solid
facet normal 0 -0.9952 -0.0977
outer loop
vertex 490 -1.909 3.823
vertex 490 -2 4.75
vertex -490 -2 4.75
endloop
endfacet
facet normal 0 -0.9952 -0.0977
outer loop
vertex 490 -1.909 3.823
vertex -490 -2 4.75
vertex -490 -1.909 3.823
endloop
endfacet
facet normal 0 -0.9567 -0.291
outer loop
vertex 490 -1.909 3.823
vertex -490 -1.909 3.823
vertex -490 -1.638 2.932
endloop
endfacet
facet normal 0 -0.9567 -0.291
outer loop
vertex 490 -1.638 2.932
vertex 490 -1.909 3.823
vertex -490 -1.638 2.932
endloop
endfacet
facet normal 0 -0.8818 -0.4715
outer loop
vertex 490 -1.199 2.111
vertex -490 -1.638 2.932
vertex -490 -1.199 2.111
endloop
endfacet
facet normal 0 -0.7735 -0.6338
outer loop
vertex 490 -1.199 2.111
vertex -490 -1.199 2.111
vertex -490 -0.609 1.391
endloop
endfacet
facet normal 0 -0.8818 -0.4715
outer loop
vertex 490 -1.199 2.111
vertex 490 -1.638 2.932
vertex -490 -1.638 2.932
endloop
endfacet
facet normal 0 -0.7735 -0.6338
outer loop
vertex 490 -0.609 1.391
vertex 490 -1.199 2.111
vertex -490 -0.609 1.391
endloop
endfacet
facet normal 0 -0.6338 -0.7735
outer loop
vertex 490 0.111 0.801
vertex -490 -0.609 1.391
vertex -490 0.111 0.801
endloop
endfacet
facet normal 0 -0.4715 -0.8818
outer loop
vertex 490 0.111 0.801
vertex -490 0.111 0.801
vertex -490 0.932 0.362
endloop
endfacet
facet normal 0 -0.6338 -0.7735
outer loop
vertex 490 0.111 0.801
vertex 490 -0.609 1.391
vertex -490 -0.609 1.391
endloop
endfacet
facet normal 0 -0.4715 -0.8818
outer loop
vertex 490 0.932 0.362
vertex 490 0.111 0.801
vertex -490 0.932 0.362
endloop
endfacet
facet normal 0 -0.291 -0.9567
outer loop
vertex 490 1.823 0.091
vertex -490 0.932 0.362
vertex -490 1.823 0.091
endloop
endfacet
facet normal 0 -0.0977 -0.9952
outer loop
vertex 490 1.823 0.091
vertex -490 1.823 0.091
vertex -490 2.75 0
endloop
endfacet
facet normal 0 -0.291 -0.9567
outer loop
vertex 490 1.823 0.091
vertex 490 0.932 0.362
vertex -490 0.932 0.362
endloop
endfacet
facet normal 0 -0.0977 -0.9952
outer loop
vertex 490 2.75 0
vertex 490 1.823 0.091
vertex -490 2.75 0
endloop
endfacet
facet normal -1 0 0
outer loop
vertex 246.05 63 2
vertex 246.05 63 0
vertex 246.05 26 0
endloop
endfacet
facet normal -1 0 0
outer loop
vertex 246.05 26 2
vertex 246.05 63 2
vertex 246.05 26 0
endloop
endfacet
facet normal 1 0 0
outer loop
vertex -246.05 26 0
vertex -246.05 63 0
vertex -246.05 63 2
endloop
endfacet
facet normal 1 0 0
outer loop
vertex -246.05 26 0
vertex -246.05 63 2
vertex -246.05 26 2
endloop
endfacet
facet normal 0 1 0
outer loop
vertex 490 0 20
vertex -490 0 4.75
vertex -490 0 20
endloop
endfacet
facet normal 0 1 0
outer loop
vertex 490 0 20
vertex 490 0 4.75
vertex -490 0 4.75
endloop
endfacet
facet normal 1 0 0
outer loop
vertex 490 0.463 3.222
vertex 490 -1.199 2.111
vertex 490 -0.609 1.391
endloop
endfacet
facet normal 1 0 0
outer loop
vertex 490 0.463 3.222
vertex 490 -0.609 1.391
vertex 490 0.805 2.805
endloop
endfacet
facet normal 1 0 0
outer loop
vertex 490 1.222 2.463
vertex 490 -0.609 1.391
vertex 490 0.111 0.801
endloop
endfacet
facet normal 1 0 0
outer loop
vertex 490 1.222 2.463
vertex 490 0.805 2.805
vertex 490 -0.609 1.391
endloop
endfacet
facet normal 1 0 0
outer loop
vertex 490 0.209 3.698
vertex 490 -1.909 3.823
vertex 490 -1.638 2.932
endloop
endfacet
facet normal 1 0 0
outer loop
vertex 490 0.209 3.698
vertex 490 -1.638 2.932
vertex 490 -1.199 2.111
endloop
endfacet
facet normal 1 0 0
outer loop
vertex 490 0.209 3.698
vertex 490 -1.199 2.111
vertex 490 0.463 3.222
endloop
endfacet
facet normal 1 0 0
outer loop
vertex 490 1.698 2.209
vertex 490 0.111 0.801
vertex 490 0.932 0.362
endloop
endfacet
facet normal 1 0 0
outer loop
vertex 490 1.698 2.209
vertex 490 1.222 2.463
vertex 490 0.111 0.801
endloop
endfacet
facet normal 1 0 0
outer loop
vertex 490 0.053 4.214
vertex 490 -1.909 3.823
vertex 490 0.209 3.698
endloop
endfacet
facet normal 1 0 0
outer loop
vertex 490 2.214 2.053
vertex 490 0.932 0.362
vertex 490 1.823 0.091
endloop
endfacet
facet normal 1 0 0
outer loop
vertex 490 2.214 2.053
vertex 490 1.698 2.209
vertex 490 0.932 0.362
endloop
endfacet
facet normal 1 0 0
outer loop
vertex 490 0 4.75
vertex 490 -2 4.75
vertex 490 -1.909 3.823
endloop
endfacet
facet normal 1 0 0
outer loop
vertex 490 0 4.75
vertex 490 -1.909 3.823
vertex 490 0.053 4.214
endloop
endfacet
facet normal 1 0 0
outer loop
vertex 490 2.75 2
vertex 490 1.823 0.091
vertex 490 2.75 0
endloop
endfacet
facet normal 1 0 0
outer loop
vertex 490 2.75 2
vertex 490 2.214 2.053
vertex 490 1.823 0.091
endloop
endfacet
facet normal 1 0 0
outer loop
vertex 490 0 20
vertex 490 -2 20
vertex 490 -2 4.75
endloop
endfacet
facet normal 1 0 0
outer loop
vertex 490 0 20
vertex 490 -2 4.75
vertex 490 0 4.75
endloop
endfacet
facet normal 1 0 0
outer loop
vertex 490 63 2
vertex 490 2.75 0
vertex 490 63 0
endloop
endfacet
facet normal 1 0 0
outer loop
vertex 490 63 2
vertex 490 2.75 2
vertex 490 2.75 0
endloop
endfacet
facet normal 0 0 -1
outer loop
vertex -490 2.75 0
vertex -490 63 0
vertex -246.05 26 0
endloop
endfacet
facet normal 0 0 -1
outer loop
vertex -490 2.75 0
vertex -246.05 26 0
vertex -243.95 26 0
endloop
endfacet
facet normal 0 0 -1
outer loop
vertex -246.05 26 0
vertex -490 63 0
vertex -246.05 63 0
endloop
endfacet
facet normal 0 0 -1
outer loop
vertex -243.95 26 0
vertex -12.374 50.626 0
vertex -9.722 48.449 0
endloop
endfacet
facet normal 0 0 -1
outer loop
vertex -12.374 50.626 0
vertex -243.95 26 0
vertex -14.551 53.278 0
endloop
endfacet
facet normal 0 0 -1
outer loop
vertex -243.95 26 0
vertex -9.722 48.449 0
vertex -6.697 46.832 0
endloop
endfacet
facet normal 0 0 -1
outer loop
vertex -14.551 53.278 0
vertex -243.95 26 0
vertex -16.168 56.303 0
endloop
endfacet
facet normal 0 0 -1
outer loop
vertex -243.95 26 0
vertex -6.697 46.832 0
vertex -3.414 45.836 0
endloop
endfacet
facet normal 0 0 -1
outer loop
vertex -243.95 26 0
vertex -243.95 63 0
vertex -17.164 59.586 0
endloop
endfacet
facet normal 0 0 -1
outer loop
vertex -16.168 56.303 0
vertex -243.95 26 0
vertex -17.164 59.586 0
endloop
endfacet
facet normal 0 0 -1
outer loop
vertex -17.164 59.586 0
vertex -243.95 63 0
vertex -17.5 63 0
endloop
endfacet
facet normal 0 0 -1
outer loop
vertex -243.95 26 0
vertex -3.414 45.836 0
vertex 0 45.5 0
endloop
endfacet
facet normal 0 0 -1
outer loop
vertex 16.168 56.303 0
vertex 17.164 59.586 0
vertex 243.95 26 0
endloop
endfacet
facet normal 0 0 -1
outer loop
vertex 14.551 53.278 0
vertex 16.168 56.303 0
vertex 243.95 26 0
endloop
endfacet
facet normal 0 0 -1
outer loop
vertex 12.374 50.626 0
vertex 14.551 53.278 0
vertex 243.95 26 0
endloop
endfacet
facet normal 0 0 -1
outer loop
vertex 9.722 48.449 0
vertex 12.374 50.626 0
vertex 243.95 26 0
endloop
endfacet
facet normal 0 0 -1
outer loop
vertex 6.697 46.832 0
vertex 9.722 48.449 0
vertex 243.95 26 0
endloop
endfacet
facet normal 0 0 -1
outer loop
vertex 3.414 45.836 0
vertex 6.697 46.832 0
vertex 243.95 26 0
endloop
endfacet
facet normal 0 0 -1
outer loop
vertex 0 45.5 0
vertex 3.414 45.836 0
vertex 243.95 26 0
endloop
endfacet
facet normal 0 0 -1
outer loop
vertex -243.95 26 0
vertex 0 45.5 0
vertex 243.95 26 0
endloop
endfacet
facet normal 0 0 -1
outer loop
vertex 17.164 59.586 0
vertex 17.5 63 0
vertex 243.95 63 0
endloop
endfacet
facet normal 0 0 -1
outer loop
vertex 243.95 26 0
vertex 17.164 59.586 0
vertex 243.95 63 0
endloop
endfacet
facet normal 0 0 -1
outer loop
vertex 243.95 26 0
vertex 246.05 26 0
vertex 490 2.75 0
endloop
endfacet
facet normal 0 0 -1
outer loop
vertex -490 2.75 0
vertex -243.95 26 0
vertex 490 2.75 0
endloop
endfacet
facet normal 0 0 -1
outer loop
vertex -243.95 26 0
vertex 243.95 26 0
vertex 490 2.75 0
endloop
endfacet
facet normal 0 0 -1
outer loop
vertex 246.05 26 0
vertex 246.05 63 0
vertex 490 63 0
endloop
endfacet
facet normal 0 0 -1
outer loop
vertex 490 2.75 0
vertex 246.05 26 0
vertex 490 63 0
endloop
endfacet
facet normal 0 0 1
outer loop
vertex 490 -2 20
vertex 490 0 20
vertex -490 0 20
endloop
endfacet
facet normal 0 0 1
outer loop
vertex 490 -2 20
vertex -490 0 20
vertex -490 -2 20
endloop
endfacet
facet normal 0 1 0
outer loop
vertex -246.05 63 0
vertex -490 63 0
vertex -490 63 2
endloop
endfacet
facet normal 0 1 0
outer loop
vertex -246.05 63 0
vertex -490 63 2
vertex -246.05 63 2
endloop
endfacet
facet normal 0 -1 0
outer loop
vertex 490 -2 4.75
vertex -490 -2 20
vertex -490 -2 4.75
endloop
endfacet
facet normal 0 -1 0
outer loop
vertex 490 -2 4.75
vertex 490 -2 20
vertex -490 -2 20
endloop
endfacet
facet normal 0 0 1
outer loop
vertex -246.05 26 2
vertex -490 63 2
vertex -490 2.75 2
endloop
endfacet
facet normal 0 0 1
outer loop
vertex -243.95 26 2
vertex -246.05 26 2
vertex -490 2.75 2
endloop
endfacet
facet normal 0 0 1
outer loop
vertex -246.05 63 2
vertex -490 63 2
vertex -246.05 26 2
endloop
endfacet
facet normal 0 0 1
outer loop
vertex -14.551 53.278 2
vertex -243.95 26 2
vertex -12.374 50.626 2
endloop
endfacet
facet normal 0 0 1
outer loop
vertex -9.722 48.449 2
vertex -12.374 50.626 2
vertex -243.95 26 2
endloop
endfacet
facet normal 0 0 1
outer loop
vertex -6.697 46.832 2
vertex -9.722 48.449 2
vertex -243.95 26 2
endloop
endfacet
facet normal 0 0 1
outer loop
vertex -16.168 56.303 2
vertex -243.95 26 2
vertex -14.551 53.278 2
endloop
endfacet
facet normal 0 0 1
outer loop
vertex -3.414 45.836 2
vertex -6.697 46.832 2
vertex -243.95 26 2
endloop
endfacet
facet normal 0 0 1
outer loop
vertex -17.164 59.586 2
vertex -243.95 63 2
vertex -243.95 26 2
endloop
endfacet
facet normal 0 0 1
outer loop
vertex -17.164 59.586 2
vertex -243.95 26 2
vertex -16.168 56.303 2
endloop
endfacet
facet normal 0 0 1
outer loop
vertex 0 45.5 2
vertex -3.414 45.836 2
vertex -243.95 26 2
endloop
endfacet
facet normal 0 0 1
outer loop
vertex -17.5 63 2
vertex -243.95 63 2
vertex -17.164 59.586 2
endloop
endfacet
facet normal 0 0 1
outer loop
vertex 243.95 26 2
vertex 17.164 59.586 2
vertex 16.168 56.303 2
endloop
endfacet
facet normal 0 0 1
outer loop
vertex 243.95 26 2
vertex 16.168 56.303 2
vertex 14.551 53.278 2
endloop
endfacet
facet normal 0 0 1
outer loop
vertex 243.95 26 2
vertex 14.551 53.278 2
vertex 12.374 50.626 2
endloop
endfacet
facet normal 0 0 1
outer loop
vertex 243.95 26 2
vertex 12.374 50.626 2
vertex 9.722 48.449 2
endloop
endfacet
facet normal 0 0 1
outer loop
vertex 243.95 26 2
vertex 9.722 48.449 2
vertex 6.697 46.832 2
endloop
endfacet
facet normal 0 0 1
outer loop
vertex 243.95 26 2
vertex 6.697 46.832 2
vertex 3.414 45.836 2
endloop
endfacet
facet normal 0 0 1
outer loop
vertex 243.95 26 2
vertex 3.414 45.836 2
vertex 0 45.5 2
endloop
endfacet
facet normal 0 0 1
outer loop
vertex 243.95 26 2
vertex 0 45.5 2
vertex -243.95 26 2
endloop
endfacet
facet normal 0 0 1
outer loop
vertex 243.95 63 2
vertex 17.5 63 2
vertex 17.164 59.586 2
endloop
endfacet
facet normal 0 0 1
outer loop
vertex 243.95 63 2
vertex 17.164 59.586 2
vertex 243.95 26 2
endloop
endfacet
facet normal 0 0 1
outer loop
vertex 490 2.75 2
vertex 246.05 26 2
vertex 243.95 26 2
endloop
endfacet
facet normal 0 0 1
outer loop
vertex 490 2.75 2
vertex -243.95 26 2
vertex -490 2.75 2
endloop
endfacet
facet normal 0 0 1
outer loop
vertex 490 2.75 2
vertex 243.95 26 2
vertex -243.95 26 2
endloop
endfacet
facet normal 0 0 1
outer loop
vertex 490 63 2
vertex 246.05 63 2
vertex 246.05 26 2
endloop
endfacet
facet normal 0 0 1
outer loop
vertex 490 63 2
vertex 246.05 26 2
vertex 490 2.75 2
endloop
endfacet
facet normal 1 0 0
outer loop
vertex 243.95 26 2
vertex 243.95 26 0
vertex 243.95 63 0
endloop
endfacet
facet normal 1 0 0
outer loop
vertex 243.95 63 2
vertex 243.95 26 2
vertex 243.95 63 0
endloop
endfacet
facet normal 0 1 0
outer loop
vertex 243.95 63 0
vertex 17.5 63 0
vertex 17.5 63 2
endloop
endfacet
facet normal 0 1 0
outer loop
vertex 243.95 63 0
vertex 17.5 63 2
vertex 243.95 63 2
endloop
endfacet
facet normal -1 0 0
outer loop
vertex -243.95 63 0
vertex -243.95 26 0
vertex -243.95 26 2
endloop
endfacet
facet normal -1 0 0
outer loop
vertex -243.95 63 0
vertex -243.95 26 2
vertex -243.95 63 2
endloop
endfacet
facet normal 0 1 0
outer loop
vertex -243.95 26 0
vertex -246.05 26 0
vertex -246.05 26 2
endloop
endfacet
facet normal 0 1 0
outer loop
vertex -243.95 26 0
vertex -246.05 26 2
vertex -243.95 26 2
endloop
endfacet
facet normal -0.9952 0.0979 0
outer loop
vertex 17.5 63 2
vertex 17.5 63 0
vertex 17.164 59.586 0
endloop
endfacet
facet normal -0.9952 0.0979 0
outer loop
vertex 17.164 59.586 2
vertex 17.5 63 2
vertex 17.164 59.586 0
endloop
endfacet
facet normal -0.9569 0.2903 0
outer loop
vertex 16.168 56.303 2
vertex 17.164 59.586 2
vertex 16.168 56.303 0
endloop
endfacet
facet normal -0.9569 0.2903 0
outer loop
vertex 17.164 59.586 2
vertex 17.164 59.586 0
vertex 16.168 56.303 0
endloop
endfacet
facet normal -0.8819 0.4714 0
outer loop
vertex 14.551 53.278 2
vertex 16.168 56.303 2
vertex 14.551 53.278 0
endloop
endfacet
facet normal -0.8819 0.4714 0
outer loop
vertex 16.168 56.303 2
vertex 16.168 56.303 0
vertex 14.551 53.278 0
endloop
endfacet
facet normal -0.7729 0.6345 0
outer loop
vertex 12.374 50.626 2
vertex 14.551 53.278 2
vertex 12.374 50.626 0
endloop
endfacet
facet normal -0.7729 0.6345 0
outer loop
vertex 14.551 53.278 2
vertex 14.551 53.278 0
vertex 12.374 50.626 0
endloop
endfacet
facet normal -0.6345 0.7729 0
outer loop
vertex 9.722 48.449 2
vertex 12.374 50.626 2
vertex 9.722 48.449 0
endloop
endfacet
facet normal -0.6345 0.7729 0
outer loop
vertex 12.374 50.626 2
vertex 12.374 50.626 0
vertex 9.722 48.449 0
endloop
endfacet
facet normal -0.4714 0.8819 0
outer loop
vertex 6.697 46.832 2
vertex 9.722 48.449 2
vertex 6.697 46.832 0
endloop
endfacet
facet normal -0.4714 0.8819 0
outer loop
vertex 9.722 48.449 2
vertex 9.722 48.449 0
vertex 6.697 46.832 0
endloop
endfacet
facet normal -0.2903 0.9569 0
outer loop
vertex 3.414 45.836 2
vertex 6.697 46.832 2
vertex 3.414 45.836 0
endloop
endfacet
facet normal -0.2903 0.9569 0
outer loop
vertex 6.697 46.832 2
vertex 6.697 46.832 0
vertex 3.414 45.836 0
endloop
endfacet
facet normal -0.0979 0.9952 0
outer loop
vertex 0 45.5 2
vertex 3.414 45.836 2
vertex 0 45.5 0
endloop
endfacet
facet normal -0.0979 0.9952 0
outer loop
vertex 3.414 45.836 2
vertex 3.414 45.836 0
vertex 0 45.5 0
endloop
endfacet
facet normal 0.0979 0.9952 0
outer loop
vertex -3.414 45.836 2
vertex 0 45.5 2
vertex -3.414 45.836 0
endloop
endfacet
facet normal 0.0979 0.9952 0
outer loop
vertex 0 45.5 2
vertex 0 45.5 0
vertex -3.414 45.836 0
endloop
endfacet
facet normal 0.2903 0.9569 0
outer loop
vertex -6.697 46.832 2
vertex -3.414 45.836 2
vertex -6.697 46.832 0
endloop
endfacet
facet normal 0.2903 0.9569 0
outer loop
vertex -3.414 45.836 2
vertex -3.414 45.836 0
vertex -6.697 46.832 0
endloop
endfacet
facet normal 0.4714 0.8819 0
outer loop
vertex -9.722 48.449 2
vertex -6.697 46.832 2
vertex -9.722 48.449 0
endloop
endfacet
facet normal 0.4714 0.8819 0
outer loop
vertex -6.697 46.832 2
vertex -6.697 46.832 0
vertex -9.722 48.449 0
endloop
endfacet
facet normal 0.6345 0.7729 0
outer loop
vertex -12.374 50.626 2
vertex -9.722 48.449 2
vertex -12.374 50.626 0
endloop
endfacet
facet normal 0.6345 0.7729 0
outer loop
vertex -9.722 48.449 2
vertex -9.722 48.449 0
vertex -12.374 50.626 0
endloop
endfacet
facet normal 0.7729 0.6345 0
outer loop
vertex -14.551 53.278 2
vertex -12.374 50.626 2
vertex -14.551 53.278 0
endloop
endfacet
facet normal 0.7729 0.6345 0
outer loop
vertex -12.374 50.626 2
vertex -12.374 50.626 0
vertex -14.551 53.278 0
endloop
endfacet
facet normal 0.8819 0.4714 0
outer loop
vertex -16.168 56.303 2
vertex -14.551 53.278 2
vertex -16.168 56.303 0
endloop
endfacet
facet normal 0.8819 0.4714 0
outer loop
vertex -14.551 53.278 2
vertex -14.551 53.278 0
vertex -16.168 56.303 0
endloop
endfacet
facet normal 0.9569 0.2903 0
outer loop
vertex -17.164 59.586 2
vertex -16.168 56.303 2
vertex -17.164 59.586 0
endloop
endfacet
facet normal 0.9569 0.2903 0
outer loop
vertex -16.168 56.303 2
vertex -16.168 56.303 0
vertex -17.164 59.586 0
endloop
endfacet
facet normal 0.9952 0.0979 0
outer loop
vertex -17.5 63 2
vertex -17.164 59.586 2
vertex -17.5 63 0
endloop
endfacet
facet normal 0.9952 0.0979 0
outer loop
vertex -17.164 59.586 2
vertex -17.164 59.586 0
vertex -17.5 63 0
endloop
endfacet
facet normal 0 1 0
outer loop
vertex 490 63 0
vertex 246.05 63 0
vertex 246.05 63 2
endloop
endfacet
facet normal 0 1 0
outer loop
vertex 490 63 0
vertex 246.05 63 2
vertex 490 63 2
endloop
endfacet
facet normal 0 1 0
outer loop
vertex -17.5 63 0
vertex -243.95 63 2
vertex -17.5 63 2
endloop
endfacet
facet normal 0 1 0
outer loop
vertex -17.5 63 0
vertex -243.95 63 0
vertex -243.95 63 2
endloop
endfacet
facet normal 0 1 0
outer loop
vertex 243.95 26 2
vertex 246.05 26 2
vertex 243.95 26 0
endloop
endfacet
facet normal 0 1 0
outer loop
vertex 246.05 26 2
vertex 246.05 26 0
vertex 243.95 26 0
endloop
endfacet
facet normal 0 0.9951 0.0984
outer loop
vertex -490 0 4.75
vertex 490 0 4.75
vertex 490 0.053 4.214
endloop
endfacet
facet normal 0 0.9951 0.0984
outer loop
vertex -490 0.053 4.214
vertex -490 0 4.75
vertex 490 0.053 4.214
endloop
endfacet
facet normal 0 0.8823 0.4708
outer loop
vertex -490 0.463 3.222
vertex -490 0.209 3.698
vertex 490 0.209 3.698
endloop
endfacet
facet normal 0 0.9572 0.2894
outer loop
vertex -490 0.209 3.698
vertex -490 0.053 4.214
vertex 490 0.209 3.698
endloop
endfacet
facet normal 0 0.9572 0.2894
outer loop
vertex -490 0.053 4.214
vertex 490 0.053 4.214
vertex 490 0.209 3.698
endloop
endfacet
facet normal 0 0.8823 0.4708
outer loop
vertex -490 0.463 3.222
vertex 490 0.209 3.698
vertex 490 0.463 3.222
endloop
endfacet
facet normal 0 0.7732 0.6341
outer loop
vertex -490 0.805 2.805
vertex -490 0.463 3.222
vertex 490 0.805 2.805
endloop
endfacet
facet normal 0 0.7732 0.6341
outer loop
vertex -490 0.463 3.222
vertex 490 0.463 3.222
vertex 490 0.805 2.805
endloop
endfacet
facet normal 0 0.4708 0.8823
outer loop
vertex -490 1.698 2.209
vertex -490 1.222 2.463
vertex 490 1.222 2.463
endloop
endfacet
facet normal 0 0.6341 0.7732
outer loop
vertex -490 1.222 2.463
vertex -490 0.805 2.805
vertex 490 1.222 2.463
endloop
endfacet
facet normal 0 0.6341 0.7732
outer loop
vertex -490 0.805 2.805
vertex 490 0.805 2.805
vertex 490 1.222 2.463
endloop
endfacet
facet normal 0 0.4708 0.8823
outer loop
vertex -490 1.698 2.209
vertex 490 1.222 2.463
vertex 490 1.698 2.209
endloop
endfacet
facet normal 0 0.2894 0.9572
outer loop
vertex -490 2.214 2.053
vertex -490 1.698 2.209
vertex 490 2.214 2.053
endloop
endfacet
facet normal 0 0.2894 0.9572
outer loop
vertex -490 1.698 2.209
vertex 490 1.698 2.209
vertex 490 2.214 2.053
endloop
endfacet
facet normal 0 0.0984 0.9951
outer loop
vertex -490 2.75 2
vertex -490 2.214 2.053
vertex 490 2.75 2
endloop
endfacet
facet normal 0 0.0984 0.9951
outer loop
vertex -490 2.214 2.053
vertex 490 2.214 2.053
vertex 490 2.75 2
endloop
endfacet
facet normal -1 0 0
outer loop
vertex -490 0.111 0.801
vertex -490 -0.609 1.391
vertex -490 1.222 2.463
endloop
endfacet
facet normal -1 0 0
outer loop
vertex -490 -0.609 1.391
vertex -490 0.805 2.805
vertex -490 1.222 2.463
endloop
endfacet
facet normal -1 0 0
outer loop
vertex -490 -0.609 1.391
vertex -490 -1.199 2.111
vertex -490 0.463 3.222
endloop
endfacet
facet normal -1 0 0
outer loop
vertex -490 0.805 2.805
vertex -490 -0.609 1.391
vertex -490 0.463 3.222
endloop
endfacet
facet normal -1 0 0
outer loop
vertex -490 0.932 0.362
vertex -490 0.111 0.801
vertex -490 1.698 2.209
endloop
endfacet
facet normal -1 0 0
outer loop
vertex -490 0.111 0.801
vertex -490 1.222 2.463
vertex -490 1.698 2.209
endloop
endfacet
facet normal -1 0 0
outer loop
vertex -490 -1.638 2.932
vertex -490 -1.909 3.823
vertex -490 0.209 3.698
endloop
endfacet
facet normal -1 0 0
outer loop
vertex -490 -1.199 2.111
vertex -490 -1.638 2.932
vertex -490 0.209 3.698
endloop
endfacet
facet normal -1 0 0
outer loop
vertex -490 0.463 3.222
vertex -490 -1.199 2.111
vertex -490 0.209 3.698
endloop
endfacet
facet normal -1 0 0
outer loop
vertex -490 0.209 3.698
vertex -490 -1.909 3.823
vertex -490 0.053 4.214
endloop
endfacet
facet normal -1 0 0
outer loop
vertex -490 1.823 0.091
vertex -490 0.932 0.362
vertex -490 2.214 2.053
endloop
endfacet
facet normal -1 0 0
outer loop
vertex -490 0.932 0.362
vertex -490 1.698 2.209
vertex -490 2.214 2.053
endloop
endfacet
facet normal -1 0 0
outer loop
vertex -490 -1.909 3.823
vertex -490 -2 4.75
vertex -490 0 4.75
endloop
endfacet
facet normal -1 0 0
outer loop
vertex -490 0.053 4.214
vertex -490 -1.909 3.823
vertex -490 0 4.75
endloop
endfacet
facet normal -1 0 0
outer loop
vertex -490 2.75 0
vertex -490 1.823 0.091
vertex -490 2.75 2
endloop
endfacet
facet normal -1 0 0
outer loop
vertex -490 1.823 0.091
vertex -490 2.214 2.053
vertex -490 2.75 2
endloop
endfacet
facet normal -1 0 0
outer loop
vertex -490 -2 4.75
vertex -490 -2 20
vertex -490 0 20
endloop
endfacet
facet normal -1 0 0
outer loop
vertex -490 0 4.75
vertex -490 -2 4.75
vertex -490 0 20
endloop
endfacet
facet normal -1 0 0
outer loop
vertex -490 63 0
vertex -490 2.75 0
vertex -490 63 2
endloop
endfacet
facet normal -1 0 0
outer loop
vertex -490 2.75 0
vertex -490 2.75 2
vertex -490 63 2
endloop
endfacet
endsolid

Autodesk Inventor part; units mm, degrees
ref_plane "YZ Plane" through (0, 0, 0) normal (1, 0, 0) x (0, 1, 0)
ref_plane "XZ Plane" through (0, 0, 0) normal (0, 1, 0) x (-1, 0, 0)
ref_plane "XY Plane" through (0, 0, 0) normal (0, 0, 1) x (1, 0, 0)
sketch "Sketch1" plane through (0, 0, 0) normal (0, 0, 1) x (1, 0, 0)
  line L0 (-490, 63) -> (490, 63)
  line L1 (490, 63) -> (490, 0)
  line L2 (490, 0) -> (-490, 0)
  line L3 (-490, 0) -> (-490, 63)
  point P0 (0, 0)
  point P1 (0, 0)
  dimension "d0" = 980
  dimension "d1" = 63
extrude "Plate1" add sketch "Sketch1" along normal blind 2
sketch "Sketch2" plane through (490, -2, 0) normal (0, 1, 0) x (-1, 0, 0)
  line L0 (980, 0) -> (0, 0)
  line L1 (0, 0) -> (0, 20)
  line L2 (0, 20) -> (980, 20)
  line L3 (980, 20) -> (980, 0)
edge flange "Flange1" height 20 angle 90 thickness 2 bend radius 2.75 thickness toward (0, 1, 0) relief round relief width 2 relief depth 1 edges at (0, 0, 2) wall of the first edge with corners at (-490, -2, 0) (490, -2, 0) (490, -2, 20) (-490, -2, 20)
bend "Bend1"
corner "Corner1"
sketch "Sketch5" plane through (0, 0, 0) normal (0, 0, -1) x (-1, 0, 0)
  line L0 (490, 63) -> (-490, 63) projected
  line L1 (490, -2) -> (-490, -2) projected
  circle A0 centre (0, 63) radius 17.5
  line L2 (243.95, 63) -> (246.05, 63)
  line L3 (246.05, 63) -> (246.05, 26)
  line L4 (246.05, 26) -> (243.95, 26)
  line L5 (243.95, 26) -> (243.95, 63)
  line L6 (-243.95, 63) -> (-246.05, 63)
  line L7 (-246.05, 63) -> (-246.05, 26)
  line L8 (-246.05, 26) -> (-243.95, 26)
  line L9 (-243.95, 26) -> (-243.95, 63)
  line L10 (0, 63) -> (0, -2) construction
  point P0 (0, 0)
  point P1 (-490, -2)
  point P2 (245, 26)
  point P3 (-245, 26)
  point P4 (246.05, 63)
  point P5 (-17.5, 63)
  point P6 (17.5, 63)
  point P7 (-246.05, 63)
  dimension "d45" = 35
  dimension "d48" = 2.1
  dimension "d49" = 490
  dimension "d51" = 28
  dimension "d52" = 37
extrude "Extrusion1" cut sketch "Sketch5" against normal through all contours L3 L4 L5 L0 | L9 L8 L7 L0 | A0 L0 picked at (-2.238, 56.1497)
sketch "Sketch9" plane through (0, 0, 2) normal (0, 0, 1) x (1, 0, 0)
  line L0 (485.6141, 29.596) -> (485.6141, 17.596) construction
  line L1 (485.6141, 17.596) -> (285.6141, 17.596) construction
  line L2 (285.6141, 17.596) -> (285.6141, 29.596) construction
  line L3 (285.6141, 29.596) -> (485.6141, 29.596) construction
  line L4 (-490, 63) -> (490, 63) projected
  point P0 (0, 0)
  point P1 (1.05, 68)
  point P2 (490, 63)
  dimension "d40" = 200
  dimension "d41" = 12
mark "Mark2"
equation "\"d2\" = Thickness"
equation "\"d3\" = BendReliefWidth"
equation "\"d4\" = BendReliefDepth"
equation "\"d5\" = MinimumRemnant"
equation "\"d6\" = TransitionRadius"
equation "\"d9\" = BendRadius"
equation "\"d10\" = CornerReliefSize"
equation "\"d11\" = GapSize"
equation "\"d12\" = JacobiRadiusSize"
equation "\"BendReliefWidth\" = Thickness"
equation "\"BendReliefDepth\" = 0.5 * Thickness"
equation "\"CornerReliefSize\" = 4 * Thickness"
equation "\"MinimumRemnant\" = 2 * Thickness"
equation "\"TransitionRadius\" = BendRadius"
equation "\"JacobiRadiusSize\" = BendRadius"
equation "\"GapSize\" = Thickness"
equation "\"Thickness\" = 2"
equation "\"BendRadius\" = 2.75"
properties part number "MSC 322 STRINGER BOARD  #" material "Stainless Steel"
